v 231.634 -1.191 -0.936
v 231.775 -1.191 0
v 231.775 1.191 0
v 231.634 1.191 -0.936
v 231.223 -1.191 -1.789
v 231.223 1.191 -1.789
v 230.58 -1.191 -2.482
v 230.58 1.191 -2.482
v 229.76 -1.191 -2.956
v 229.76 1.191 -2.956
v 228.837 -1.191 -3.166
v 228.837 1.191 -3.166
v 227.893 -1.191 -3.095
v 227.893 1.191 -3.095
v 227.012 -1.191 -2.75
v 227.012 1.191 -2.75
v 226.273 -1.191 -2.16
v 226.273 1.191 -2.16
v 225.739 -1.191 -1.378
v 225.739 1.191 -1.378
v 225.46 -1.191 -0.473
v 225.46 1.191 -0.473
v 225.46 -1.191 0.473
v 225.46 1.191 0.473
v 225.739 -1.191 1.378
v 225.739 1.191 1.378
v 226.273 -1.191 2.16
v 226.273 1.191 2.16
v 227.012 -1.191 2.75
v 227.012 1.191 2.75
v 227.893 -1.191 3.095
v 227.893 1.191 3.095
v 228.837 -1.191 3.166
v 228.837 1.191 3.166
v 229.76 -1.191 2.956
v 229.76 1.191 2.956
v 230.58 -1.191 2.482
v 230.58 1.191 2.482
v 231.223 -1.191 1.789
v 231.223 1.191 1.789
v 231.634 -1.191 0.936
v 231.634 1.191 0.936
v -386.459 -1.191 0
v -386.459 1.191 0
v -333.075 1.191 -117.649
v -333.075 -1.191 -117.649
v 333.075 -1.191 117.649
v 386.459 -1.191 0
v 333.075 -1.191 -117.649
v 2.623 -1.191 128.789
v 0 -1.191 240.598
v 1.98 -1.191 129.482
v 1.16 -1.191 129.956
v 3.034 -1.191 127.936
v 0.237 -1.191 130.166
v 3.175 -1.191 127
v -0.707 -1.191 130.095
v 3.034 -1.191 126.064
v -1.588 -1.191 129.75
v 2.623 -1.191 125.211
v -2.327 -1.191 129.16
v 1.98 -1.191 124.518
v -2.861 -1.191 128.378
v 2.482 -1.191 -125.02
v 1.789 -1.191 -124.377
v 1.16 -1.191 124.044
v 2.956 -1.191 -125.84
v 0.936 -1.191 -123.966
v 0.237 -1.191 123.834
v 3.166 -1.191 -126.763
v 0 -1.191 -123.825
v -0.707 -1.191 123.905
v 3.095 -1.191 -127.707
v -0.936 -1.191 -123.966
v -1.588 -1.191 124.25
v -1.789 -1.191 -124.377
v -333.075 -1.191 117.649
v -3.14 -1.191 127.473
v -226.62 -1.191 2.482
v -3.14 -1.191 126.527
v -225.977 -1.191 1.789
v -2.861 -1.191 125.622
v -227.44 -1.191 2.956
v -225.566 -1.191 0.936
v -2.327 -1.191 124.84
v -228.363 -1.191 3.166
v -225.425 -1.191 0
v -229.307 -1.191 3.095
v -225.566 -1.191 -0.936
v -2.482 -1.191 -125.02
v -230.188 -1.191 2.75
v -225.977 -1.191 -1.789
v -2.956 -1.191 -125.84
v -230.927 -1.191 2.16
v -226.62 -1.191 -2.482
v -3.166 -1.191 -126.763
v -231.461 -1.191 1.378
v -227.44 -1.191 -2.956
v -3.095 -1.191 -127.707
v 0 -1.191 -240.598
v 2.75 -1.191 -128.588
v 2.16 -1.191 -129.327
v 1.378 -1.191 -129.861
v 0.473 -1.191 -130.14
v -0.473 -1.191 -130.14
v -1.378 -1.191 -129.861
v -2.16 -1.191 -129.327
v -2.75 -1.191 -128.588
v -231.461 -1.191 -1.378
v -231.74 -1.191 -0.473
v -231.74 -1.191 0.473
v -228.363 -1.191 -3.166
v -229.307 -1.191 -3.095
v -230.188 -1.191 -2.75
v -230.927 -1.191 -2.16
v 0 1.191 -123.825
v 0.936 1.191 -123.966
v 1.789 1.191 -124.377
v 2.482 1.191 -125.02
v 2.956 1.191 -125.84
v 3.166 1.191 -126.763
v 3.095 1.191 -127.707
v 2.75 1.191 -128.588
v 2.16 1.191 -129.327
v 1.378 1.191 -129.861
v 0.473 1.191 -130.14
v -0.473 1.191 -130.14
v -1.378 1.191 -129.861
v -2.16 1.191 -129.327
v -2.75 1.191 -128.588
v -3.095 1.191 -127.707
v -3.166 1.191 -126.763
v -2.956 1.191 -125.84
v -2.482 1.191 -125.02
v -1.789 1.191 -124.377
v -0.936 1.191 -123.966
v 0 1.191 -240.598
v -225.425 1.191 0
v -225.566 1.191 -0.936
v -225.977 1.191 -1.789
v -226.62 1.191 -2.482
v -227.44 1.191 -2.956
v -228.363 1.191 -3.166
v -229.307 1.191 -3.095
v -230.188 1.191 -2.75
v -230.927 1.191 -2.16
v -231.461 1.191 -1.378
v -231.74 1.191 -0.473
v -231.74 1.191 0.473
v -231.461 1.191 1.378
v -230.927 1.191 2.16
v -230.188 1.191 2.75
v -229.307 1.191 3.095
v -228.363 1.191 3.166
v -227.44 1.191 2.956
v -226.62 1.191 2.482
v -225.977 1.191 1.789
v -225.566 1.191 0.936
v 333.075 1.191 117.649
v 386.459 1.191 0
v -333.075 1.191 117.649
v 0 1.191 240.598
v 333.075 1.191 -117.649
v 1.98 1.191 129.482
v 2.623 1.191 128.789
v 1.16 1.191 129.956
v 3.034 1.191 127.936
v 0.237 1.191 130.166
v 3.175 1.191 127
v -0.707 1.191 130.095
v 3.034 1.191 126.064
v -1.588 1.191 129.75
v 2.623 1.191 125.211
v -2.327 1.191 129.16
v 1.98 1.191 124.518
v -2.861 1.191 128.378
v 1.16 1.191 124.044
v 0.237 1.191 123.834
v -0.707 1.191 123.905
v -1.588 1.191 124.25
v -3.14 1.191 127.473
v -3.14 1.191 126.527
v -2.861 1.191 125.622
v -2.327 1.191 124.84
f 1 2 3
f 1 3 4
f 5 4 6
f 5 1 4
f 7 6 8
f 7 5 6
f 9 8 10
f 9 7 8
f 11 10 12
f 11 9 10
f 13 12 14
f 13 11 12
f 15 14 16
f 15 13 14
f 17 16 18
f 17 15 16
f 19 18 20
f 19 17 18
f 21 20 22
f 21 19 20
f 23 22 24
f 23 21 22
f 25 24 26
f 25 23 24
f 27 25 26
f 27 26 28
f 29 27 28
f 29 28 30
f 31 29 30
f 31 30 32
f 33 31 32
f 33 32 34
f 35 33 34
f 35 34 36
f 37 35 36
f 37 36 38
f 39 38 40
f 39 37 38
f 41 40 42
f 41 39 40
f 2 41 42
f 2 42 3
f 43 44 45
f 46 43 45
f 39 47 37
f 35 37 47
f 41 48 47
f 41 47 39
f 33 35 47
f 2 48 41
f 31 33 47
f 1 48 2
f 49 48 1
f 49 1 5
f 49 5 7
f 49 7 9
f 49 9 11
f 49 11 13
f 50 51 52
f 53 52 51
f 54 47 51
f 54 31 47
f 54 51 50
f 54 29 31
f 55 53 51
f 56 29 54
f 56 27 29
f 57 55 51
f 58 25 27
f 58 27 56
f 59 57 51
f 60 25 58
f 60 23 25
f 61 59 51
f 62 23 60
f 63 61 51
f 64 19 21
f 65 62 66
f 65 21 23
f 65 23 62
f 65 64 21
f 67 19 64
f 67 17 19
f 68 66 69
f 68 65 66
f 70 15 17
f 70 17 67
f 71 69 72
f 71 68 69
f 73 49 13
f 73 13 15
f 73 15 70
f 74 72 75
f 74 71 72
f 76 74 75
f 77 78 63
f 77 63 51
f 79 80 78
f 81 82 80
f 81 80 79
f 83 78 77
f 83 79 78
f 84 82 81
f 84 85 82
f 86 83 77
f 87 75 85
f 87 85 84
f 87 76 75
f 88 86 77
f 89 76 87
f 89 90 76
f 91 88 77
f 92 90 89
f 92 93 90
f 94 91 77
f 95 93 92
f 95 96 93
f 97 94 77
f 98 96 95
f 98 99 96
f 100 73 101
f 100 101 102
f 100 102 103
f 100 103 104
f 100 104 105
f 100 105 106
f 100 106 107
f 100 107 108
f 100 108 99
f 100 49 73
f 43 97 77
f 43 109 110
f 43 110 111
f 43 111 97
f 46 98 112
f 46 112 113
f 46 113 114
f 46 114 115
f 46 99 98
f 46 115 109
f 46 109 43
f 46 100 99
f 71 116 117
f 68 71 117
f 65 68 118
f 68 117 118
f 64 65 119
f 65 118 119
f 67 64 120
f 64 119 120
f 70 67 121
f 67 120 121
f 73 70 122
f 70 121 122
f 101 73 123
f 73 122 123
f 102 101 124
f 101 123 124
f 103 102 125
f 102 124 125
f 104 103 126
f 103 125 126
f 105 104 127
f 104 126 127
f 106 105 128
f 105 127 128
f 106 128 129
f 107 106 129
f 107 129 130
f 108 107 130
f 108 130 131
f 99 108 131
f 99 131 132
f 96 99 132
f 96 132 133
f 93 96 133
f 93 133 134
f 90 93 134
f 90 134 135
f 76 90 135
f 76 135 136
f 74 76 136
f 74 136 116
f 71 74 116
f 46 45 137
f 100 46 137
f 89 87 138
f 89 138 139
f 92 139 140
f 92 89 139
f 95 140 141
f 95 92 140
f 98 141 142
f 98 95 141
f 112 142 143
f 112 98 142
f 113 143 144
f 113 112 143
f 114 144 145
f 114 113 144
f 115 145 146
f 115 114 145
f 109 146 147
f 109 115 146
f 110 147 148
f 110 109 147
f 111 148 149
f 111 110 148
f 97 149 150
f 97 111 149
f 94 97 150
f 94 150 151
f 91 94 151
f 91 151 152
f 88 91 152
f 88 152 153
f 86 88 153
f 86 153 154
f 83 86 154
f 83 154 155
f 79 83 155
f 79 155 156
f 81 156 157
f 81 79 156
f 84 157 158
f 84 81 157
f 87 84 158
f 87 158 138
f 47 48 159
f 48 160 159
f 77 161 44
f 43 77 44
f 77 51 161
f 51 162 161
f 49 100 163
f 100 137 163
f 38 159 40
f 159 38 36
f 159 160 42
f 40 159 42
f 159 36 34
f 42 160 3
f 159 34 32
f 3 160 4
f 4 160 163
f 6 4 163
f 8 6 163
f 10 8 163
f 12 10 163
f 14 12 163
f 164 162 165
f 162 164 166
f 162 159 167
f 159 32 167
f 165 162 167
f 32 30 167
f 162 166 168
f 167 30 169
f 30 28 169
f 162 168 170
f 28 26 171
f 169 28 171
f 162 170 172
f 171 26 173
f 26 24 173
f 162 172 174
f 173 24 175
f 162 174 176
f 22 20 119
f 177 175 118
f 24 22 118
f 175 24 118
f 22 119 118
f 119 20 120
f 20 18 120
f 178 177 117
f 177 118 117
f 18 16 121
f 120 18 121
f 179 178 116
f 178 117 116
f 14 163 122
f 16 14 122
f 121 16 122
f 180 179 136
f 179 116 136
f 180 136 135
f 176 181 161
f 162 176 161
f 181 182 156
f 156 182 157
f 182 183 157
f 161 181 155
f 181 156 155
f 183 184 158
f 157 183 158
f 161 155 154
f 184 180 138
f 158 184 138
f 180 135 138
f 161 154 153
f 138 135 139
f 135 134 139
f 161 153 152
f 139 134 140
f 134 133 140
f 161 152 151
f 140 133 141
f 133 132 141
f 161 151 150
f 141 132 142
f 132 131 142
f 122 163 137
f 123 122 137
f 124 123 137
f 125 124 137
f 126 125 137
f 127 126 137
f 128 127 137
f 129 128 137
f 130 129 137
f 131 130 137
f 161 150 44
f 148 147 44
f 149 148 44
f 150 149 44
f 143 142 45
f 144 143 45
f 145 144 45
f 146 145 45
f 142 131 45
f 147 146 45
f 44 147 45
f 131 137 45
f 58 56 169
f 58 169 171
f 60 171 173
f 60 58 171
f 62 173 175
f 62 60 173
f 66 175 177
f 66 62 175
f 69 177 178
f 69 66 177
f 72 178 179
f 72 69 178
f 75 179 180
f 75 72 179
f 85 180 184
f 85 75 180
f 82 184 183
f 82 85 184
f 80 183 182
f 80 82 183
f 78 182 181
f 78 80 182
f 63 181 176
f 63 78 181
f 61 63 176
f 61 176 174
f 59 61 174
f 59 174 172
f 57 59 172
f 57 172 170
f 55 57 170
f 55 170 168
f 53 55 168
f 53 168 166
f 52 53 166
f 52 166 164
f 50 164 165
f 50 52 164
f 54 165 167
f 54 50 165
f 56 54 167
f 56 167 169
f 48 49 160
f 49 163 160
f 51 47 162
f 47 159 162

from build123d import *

# Parameters (mm, degrees)
BOSS_EXTRUDE1_DEPTH   = 1.190625
SKETCH2_R             = 3.175
CUT_EXTRUDE1_DEPTH    = 456.240158496
CRVPATTERN1_START     = -1.190625
CRVPATTERN1_OUTLINE_R = 3.175
CRVPATTERN1_DEPTH     = 2.38125


# Read off the part's stored shape, not the designer's step: CrvPattern1
with BuildPart() as part:
    # Sketch1 → Boss-Extrude1 (new, symmetric)
    with BuildSketch(Plane(origin=(0, 0, 0), x_dir=(1, 0, 0), z_dir=(0, 1, 0))):
        Polygon((-333.074526413, 117.648642651), (0, 240.597926469), (333.074526413, 117.648642651), (386.459013784, 0), (333.074526413, -117.648642651), (0, -240.597926469), (-333.074526413, -117.648642651), (-386.459013784, 0), align=None)
    extrude(amount=BOSS_EXTRUDE1_DEPTH, both=True)

    # Sketch2 → Cut-Extrude1 (cut, through all)
    with BuildSketch(Plane(origin=(0, 1.190625, 0), x_dir=(1, 0, 0), z_dir=(0, 1, 0))):
        with Locations(Location((0, 127, 0), (0, 0, 270))):
            Circle(SKETCH2_R)
    extrude(amount=-CUT_EXTRUDE1_DEPTH, mode=Mode.SUBTRACT)

    # CrvPattern1 outline → CrvPattern1 (cut)
    with BuildSketch(Plane(origin=(0, 0, 0), x_dir=(1, 0, 0), z_dir=(0, 1, 0)).offset(CRVPATTERN1_START)):
        with Locations((-228.6, 0)):
            Circle(CRVPATTERN1_OUTLINE_R)
        with Locations((0, -127)):
            Circle(CRVPATTERN1_OUTLINE_R)
        with Locations((228.6, 0)):
            Circle(CRVPATTERN1_OUTLINE_R)
    extrude(amount=CRVPATTERN1_DEPTH, mode=Mode.SUBTRACT)


solid = part.part
